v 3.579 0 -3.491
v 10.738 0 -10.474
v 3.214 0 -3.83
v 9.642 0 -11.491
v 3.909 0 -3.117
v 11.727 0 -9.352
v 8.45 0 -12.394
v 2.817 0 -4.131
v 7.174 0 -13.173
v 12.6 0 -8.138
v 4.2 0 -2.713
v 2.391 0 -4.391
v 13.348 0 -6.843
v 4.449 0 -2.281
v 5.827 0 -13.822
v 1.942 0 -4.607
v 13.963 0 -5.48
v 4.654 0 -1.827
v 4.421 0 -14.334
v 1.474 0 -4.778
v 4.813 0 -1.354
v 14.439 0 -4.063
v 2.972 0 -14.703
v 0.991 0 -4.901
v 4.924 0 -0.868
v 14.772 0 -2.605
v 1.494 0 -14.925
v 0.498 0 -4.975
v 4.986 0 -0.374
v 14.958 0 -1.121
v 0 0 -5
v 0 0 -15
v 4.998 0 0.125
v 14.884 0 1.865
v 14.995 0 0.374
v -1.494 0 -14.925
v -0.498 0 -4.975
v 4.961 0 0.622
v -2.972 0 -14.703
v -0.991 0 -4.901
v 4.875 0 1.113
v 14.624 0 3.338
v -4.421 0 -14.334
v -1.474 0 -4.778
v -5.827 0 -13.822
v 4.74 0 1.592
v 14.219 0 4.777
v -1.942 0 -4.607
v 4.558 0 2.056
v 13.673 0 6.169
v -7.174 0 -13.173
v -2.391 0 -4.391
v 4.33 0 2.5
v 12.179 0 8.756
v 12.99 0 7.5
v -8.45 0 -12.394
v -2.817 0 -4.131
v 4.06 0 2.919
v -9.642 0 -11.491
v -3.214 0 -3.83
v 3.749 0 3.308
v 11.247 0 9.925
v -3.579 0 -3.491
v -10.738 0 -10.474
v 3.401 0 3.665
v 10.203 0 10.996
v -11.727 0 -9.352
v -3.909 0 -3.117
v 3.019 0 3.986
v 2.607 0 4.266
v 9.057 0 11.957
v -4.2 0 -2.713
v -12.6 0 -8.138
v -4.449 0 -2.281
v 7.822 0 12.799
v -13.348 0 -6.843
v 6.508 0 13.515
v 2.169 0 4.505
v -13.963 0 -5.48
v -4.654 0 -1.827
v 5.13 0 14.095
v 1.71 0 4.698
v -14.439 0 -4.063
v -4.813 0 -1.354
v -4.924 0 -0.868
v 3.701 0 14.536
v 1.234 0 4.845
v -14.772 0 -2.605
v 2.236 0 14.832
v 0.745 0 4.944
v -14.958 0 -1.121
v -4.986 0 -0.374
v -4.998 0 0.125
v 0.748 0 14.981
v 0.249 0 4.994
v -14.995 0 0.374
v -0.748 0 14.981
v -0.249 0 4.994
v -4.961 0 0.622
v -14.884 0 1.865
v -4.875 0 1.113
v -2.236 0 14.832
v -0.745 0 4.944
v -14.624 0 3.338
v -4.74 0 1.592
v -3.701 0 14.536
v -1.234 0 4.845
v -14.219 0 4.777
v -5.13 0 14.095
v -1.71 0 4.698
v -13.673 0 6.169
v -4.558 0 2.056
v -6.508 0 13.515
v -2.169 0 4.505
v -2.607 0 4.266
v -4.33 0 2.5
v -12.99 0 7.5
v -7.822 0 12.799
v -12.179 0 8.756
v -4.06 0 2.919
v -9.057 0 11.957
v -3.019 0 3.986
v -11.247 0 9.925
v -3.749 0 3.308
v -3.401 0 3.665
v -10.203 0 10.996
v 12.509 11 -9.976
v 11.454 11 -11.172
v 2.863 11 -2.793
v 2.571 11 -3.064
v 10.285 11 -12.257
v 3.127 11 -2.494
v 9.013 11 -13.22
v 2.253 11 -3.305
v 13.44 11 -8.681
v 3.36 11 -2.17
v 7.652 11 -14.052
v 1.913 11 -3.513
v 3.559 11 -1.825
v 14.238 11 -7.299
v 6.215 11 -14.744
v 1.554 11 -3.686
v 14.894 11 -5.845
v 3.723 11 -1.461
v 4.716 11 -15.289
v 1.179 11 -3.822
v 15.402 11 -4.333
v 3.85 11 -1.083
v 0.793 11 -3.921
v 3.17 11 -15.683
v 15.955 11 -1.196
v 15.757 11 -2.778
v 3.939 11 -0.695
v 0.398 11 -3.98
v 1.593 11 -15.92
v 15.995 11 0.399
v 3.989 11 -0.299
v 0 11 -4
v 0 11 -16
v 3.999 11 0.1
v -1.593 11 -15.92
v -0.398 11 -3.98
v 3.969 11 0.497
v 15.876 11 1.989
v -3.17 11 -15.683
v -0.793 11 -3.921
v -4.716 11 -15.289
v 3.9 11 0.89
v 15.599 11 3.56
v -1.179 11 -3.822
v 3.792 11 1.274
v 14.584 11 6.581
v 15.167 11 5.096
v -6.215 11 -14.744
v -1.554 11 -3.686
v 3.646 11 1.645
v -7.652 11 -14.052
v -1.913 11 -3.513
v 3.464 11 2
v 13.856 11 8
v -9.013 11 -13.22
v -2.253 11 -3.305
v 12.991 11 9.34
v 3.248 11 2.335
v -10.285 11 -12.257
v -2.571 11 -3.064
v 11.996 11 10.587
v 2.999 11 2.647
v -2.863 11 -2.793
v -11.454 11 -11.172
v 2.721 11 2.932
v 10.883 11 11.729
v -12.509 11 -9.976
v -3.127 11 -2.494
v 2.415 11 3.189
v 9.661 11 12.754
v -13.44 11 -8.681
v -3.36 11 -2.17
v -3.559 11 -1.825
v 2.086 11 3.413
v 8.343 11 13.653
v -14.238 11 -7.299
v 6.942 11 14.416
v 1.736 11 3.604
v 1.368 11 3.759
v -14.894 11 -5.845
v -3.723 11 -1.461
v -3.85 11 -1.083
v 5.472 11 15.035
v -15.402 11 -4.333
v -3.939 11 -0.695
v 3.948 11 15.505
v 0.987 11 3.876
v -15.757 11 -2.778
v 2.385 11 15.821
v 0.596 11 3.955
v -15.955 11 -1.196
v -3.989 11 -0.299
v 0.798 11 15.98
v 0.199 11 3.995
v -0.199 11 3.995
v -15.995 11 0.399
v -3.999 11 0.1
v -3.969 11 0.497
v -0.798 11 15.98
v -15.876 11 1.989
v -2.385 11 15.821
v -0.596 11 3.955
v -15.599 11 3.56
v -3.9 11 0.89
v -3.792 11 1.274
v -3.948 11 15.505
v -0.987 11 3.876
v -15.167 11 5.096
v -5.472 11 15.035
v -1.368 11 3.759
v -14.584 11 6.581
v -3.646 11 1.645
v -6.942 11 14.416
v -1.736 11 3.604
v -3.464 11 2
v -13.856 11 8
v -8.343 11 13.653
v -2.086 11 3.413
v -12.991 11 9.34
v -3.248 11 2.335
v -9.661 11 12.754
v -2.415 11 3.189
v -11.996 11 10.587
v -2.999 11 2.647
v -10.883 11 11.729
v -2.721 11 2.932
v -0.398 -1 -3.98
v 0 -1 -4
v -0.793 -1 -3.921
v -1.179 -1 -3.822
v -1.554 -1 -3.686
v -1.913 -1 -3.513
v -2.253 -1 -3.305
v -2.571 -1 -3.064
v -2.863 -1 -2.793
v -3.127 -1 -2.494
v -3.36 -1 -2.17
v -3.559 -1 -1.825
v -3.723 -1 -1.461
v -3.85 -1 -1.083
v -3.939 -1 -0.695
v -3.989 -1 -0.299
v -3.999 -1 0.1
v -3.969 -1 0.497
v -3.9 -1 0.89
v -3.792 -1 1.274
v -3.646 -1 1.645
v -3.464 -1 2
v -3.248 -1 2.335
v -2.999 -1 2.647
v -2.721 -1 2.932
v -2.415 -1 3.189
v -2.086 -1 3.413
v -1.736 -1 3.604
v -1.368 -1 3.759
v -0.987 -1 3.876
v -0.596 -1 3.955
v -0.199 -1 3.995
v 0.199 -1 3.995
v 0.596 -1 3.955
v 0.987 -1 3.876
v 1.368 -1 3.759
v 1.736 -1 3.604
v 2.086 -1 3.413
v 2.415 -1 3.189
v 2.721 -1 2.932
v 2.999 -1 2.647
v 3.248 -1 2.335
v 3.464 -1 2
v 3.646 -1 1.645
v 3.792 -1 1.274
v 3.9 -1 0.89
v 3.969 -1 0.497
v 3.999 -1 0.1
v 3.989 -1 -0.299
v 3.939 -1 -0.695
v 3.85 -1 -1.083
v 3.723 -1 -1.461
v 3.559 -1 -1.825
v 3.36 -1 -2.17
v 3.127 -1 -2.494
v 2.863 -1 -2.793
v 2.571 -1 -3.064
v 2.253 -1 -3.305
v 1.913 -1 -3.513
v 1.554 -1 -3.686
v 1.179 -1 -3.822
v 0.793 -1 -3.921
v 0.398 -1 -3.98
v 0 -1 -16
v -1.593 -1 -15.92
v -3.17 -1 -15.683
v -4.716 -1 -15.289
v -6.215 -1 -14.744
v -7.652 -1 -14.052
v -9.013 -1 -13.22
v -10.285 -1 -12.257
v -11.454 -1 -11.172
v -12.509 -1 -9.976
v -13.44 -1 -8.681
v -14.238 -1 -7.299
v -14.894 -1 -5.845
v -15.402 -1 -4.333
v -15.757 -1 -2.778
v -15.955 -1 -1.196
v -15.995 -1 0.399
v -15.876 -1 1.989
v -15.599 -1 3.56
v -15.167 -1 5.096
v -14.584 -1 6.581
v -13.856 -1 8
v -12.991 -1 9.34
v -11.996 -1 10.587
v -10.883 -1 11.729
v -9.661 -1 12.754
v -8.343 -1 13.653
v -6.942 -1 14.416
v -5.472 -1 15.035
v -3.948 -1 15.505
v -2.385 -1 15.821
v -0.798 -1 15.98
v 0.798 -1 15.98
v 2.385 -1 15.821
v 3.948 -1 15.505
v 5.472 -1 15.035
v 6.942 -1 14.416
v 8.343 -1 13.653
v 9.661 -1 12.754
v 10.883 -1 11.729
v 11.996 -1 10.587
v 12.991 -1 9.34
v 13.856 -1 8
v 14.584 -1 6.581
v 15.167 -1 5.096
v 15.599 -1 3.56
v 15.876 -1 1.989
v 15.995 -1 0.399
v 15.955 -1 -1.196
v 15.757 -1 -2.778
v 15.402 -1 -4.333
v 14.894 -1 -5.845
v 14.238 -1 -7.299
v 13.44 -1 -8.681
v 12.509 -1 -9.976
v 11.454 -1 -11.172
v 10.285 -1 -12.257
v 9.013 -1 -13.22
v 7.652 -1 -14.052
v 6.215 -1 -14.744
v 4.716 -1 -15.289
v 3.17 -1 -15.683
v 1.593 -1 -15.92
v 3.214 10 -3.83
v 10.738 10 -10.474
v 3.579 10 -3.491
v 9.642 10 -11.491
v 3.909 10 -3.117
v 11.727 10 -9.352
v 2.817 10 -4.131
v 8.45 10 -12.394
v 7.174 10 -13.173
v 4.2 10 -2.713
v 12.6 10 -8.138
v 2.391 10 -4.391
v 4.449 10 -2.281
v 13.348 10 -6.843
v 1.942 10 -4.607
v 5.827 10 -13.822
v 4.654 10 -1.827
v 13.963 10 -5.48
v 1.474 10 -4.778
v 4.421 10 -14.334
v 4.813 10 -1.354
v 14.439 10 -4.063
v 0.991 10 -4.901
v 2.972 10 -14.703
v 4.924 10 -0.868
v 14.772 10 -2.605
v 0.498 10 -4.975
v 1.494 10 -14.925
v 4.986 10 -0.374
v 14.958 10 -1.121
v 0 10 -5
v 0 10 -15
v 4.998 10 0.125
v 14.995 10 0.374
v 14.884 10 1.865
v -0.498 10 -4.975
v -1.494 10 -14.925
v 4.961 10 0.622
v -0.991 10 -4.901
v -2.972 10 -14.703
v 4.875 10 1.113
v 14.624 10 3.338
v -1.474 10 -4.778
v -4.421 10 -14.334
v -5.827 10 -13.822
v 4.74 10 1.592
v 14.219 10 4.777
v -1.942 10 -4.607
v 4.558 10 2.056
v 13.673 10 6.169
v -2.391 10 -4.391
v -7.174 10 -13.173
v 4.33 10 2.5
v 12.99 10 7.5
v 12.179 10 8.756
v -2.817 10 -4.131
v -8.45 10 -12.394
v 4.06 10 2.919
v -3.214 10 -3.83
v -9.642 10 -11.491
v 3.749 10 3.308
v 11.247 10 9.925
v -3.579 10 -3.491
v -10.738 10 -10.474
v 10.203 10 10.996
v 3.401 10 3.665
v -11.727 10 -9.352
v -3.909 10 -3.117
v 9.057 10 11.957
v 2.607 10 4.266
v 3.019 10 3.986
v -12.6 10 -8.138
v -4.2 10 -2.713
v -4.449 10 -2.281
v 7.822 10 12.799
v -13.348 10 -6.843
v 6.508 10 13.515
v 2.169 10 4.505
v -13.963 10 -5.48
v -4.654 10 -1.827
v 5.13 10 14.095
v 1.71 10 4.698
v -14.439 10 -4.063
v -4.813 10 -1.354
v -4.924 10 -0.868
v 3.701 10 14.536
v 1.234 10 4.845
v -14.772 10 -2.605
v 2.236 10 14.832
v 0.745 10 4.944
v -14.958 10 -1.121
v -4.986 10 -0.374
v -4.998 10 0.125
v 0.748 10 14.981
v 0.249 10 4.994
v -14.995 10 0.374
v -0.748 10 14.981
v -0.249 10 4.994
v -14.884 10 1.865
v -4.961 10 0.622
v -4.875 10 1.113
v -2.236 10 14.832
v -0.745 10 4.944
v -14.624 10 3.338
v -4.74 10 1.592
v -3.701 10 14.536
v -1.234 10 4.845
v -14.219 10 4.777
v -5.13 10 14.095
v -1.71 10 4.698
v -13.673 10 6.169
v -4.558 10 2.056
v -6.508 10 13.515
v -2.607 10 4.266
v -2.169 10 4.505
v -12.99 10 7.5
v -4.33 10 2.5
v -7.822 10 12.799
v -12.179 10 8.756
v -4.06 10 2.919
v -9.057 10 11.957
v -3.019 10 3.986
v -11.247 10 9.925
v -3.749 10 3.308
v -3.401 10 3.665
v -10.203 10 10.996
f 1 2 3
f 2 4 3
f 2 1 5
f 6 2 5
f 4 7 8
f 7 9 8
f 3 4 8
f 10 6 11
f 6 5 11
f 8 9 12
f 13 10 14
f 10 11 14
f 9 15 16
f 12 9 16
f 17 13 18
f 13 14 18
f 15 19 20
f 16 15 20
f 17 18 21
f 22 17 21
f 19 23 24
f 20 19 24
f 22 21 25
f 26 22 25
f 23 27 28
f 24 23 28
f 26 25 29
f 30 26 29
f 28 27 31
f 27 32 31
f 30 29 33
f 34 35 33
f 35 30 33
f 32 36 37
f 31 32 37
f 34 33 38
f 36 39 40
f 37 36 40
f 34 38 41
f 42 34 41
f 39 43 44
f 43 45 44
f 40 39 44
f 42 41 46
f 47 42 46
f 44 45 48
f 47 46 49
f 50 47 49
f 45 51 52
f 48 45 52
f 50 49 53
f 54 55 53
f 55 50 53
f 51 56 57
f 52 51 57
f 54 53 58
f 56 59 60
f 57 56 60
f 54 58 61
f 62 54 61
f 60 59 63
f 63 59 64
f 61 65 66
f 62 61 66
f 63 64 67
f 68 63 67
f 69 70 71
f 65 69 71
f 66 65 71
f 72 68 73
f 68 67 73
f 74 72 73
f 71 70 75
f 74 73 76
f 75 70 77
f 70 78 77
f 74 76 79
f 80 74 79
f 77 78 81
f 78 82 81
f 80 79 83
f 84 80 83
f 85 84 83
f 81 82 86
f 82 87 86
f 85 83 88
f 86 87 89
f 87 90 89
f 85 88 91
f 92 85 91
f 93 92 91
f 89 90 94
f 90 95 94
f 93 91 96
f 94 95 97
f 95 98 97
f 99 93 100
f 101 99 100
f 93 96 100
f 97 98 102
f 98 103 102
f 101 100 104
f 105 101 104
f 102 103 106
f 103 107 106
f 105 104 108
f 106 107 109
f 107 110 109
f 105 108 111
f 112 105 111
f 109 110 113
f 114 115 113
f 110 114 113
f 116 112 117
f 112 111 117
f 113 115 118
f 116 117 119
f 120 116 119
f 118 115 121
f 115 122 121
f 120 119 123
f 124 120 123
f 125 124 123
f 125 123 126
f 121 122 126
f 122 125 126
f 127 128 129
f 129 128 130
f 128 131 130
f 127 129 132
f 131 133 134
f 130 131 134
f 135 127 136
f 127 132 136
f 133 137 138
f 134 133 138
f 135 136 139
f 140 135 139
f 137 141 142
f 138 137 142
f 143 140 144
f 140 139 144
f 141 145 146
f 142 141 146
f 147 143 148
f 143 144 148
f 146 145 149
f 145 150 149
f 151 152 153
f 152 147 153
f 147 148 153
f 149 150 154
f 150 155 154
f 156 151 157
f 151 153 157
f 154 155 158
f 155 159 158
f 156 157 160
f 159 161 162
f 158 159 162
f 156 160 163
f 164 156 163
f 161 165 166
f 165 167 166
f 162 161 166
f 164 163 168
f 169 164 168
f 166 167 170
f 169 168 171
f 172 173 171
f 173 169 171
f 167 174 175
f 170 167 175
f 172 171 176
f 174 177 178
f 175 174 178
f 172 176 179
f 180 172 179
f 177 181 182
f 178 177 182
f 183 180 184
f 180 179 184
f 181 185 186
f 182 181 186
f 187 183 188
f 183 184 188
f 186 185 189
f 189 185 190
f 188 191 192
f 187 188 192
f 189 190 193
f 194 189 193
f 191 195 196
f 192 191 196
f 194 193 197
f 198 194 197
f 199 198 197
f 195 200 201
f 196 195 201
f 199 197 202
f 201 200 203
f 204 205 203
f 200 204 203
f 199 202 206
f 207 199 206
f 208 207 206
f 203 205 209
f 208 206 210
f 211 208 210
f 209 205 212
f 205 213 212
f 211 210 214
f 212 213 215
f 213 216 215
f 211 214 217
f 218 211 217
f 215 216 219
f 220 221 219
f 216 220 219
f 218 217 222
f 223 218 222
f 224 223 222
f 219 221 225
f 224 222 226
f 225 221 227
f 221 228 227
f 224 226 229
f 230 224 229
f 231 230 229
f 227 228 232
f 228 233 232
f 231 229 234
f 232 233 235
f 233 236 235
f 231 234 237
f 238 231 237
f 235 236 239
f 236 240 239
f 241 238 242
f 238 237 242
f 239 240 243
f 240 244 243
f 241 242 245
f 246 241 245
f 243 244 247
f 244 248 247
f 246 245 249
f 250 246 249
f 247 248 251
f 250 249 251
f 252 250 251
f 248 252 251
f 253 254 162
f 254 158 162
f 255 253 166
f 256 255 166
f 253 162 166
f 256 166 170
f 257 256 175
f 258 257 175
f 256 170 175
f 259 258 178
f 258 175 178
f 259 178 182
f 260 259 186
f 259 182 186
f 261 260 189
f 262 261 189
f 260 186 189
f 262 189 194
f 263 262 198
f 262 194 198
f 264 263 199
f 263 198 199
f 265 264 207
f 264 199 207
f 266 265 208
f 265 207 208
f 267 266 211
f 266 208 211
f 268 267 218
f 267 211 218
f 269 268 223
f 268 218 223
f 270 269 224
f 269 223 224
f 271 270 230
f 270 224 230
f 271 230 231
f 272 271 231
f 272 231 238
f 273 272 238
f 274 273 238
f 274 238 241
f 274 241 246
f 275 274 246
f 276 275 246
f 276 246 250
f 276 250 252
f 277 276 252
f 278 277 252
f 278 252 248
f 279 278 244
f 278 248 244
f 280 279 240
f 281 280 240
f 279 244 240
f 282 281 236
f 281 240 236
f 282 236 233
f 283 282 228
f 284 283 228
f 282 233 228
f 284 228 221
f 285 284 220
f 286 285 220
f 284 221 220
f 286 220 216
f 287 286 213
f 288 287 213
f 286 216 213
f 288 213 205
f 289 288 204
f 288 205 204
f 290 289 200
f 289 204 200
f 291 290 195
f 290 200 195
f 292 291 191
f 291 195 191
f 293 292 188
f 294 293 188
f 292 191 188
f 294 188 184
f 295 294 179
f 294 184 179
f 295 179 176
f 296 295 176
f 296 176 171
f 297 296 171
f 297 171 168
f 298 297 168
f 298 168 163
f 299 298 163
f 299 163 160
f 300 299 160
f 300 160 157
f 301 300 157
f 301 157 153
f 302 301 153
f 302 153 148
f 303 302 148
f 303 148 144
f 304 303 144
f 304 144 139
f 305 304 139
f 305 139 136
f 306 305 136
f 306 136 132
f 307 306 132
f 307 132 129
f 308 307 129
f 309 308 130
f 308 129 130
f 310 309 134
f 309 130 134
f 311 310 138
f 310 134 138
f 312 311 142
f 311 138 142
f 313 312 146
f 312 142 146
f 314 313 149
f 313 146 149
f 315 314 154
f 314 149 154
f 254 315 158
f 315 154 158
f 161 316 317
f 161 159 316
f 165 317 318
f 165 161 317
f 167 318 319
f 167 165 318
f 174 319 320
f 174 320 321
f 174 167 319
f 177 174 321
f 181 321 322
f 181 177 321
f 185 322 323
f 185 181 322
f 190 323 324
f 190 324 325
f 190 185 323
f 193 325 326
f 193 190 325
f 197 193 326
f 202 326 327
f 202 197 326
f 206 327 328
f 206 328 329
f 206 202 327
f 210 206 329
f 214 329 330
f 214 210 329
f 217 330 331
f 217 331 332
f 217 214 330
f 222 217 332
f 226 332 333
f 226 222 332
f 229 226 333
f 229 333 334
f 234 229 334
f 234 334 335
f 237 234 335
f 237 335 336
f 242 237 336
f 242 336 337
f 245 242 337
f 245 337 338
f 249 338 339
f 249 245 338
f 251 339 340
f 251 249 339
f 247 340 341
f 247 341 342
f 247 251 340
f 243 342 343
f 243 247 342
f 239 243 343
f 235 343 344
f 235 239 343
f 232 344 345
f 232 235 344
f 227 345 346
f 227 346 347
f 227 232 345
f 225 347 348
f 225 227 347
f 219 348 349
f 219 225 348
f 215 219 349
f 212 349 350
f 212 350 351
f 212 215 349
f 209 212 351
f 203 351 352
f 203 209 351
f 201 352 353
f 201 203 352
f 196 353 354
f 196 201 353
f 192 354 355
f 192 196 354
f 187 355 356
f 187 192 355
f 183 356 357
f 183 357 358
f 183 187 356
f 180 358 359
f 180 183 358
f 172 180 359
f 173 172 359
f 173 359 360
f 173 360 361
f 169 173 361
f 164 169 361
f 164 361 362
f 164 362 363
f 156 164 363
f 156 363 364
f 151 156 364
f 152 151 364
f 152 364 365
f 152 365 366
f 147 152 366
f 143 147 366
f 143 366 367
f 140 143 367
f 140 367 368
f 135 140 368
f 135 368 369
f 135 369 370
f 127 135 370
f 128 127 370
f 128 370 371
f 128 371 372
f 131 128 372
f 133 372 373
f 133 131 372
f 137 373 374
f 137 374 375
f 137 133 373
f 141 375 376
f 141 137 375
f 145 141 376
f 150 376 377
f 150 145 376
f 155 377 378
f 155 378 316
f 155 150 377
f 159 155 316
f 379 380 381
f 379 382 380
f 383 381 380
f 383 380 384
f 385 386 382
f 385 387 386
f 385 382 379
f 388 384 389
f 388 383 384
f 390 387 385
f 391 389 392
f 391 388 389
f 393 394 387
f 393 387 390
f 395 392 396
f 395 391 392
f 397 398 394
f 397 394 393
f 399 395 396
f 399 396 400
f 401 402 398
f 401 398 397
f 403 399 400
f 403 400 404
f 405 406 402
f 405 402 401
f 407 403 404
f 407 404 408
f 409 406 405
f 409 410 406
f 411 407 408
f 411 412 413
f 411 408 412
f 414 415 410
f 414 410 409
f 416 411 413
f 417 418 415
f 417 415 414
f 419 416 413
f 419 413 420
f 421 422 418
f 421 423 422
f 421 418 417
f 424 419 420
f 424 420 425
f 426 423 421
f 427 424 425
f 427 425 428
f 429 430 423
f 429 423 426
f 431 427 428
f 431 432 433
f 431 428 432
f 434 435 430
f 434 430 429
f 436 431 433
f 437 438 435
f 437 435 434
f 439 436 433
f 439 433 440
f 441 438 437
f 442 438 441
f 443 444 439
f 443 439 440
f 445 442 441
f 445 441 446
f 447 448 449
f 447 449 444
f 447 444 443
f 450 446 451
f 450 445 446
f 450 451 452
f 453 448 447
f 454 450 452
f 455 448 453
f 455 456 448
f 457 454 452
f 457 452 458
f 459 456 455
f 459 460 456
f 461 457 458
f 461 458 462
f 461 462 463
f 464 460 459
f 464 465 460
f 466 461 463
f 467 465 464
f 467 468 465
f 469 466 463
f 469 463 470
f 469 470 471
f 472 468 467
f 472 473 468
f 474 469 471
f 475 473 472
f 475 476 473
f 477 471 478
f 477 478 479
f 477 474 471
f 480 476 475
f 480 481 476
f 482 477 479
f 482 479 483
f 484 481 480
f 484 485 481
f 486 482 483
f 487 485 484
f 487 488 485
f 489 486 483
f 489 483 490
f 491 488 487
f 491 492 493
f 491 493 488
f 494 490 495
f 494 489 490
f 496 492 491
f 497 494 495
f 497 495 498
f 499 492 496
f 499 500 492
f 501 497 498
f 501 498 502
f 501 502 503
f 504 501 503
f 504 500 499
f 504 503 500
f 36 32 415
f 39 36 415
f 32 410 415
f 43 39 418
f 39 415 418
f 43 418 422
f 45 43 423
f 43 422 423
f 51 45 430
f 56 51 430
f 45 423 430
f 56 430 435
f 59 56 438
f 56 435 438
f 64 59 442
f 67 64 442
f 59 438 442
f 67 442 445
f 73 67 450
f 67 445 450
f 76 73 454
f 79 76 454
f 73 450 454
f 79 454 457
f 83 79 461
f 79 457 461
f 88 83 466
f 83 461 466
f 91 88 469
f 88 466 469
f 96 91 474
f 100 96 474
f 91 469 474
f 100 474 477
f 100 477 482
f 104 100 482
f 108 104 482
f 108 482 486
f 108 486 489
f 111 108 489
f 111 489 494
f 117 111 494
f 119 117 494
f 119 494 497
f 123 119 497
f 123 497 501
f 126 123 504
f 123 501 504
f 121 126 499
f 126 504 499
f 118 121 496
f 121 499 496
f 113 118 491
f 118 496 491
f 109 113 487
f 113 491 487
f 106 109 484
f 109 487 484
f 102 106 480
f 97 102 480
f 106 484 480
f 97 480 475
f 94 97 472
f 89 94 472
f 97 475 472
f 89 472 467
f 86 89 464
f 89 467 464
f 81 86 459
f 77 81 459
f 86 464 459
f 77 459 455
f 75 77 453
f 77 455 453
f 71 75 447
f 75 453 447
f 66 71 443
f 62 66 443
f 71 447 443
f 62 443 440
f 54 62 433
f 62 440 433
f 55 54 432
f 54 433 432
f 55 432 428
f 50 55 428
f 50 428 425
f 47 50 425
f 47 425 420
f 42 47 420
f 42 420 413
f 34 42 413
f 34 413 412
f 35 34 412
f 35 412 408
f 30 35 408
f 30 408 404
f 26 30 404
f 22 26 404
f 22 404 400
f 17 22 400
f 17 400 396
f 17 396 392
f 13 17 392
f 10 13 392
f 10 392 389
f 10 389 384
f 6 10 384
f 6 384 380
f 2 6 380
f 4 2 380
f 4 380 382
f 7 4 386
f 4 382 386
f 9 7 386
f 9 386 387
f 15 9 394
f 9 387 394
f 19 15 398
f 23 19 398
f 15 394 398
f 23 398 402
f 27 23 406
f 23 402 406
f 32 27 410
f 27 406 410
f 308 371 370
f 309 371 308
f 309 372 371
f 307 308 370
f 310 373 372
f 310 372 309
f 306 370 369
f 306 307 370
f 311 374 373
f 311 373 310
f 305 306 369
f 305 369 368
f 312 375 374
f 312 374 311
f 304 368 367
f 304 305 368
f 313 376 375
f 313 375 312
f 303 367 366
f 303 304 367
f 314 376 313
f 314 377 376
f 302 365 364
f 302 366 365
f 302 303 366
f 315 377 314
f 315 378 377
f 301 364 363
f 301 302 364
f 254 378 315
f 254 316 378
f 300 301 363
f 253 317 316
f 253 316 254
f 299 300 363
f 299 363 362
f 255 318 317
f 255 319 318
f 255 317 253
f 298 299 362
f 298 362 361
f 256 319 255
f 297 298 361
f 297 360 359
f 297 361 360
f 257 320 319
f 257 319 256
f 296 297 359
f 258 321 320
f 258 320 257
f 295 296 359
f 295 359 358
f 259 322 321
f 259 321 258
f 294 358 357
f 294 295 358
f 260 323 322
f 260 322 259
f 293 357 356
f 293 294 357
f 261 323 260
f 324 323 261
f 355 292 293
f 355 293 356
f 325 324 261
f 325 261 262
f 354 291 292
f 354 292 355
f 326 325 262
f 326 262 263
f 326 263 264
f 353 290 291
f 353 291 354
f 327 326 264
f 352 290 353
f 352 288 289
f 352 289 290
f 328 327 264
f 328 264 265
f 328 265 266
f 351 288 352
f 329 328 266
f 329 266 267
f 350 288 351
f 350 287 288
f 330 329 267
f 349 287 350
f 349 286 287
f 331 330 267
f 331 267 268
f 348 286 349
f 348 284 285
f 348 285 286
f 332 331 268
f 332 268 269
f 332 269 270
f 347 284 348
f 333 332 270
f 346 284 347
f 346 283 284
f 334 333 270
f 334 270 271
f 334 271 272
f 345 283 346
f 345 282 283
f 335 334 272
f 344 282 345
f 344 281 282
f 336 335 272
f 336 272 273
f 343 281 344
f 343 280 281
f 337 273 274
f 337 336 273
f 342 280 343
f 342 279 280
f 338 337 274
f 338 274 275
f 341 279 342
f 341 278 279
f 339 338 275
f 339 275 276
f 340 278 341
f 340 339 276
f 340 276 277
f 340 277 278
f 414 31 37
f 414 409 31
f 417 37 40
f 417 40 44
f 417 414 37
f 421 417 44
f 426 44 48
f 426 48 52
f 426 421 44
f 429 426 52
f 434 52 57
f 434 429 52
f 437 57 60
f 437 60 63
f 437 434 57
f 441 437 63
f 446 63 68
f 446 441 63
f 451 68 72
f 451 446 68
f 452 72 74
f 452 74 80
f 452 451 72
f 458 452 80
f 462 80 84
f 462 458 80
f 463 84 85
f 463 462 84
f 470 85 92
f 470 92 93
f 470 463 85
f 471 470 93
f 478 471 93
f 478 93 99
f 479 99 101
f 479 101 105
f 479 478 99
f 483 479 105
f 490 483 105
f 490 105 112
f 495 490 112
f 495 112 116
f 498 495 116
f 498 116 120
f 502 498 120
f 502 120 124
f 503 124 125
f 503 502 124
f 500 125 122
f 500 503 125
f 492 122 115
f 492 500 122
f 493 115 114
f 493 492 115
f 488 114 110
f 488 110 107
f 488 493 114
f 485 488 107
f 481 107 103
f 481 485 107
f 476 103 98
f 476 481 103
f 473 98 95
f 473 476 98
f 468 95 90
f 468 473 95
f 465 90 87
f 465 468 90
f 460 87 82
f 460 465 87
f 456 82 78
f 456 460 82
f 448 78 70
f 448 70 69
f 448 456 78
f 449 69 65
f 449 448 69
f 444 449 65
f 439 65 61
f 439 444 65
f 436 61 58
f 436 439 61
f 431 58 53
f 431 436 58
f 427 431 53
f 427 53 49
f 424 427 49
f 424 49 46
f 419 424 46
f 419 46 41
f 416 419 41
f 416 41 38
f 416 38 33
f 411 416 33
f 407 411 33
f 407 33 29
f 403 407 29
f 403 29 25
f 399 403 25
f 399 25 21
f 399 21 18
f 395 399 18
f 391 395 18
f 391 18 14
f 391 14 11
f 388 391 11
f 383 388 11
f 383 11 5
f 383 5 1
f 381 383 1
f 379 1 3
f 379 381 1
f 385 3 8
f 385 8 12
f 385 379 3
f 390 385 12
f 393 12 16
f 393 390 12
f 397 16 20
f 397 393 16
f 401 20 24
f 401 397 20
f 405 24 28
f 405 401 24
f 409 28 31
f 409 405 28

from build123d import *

# Parameters (mm, degrees)
SKETCH_1_W   = 12
SKETCH_1_H   = 12
SKETCH_1_W_2 = 10
SKETCH_1_H_2 = 10


with BuildPart() as part:
    # 草图1 → ThinRevolve360 (revolve)
    with BuildSketch(Plane.XY, mode=Mode.PRIVATE) as thinrevolve360_sk:
        with Locations((10, 5)):
            Rectangle(SKETCH_1_W, SKETCH_1_H)
        with Locations((10, 5)):
            Rectangle(SKETCH_1_W_2, SKETCH_1_H_2, mode=Mode.SUBTRACT)
    revolve(thinrevolve360_sk.sketch.rotate(Axis((0, 0, 0), (0, 1, 0)), 90), axis=Axis((0, 0, 0), (0, 1, 0)))


solid = part.part
